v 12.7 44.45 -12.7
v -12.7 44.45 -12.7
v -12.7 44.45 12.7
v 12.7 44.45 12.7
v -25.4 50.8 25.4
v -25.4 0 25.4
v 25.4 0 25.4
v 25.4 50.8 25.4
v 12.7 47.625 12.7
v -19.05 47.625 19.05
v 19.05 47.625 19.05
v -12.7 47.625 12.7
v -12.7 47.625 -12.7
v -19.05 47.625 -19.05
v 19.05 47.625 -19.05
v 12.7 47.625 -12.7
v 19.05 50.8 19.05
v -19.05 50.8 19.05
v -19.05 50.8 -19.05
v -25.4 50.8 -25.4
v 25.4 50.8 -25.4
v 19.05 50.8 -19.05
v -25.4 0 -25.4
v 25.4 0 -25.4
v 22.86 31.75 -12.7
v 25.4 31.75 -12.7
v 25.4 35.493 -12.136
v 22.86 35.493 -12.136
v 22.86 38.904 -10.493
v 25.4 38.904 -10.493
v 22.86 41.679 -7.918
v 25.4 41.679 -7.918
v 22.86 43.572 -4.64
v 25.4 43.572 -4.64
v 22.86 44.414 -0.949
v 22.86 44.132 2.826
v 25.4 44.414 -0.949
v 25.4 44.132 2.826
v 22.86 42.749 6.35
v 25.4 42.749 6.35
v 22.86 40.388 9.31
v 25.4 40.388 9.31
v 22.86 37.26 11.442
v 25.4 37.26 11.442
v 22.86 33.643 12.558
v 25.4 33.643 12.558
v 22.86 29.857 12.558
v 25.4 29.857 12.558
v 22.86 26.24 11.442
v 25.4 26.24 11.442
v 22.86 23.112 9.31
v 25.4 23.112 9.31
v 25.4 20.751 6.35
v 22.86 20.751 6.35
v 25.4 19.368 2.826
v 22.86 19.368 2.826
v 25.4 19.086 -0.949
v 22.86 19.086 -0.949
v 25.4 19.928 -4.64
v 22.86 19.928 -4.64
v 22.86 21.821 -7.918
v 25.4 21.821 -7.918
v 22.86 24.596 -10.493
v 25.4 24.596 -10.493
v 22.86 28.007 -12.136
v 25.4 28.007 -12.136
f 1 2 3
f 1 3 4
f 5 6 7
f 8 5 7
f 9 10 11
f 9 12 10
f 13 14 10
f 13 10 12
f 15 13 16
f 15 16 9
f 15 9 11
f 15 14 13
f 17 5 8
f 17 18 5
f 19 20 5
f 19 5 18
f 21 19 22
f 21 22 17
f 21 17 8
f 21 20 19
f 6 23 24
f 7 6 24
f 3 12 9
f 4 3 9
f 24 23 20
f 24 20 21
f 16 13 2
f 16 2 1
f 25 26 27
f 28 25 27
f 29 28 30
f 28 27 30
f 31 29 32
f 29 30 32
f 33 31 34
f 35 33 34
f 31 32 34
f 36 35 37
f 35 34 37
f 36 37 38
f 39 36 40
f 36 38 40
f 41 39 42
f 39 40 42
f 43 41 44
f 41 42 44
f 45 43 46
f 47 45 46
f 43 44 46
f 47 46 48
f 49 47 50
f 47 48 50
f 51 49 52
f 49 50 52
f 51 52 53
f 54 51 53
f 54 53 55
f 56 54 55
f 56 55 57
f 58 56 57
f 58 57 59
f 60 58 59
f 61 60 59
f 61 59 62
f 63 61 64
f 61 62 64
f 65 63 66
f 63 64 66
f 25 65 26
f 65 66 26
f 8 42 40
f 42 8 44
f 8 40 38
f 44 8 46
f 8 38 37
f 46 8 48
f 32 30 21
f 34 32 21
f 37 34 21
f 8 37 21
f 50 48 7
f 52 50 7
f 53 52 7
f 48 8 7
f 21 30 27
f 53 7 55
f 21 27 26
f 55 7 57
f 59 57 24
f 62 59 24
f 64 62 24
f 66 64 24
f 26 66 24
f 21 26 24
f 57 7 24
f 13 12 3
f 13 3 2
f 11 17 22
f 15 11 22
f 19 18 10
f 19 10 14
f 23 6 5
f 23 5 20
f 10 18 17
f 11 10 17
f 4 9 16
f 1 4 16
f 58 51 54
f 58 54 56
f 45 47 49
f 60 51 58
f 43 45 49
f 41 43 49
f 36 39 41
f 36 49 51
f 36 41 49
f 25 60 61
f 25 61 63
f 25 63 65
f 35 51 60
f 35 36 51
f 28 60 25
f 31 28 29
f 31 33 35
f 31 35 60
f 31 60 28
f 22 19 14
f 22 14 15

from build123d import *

# Parameters (mm, degrees)
SKETCH1_W           = 50.8
SKETCH1_H           = 50.8
BOSS_EXTRUDE1_DEPTH = 50.8
SKETCH4_R           = 12.7
CUT_EXTRUDE3_DEPTH  = 2.54
SKETCH5_W           = 38.1
SKETCH5_H           = 38.1
CUT_EXTRUDE5_DEPTH  = 3.175
SKETCH6_W           = 25.4
SKETCH6_H           = 25.4
CUT_EXTRUDE6_DEPTH  = 3.175


with BuildPart() as part:
    # Sketch1 → Boss-Extrude1 (new body)
    with BuildSketch(Plane(origin=(0, 0, 0), x_dir=(1, 0, 0), z_dir=(0, 1, 0))):
        Rectangle(SKETCH1_W, SKETCH1_H)
    extrude(amount=BOSS_EXTRUDE1_DEPTH)

    # Sketch4 → Cut-Extrude3 (cut)
    with BuildSketch(Plane(origin=(25.4, 0, 0), x_dir=(0, 0, -1), z_dir=(1, 0, 0))):
        with Locations((0, 31.75)):
            Circle(SKETCH4_R)
    extrude(amount=-CUT_EXTRUDE3_DEPTH, mode=Mode.SUBTRACT)

    # Sketch5 → Cut-Extrude5 (cut)
    with BuildSketch(Plane(origin=(0, 50.8, 0), x_dir=(1, 0, 0), z_dir=(0, 1, 0))):
        Rectangle(SKETCH5_W, SKETCH5_H)
    extrude(amount=-CUT_EXTRUDE5_DEPTH, mode=Mode.SUBTRACT)

    # Sketch6 → Cut-Extrude6 (cut)
    with BuildSketch(Plane(origin=(0, 47.625, 0), x_dir=(1, 0, 0), z_dir=(0, 1, 0))):
        Rectangle(SKETCH6_W, SKETCH6_H)
    extrude(amount=-CUT_EXTRUDE6_DEPTH, mode=Mode.SUBTRACT)


solid = part.part
